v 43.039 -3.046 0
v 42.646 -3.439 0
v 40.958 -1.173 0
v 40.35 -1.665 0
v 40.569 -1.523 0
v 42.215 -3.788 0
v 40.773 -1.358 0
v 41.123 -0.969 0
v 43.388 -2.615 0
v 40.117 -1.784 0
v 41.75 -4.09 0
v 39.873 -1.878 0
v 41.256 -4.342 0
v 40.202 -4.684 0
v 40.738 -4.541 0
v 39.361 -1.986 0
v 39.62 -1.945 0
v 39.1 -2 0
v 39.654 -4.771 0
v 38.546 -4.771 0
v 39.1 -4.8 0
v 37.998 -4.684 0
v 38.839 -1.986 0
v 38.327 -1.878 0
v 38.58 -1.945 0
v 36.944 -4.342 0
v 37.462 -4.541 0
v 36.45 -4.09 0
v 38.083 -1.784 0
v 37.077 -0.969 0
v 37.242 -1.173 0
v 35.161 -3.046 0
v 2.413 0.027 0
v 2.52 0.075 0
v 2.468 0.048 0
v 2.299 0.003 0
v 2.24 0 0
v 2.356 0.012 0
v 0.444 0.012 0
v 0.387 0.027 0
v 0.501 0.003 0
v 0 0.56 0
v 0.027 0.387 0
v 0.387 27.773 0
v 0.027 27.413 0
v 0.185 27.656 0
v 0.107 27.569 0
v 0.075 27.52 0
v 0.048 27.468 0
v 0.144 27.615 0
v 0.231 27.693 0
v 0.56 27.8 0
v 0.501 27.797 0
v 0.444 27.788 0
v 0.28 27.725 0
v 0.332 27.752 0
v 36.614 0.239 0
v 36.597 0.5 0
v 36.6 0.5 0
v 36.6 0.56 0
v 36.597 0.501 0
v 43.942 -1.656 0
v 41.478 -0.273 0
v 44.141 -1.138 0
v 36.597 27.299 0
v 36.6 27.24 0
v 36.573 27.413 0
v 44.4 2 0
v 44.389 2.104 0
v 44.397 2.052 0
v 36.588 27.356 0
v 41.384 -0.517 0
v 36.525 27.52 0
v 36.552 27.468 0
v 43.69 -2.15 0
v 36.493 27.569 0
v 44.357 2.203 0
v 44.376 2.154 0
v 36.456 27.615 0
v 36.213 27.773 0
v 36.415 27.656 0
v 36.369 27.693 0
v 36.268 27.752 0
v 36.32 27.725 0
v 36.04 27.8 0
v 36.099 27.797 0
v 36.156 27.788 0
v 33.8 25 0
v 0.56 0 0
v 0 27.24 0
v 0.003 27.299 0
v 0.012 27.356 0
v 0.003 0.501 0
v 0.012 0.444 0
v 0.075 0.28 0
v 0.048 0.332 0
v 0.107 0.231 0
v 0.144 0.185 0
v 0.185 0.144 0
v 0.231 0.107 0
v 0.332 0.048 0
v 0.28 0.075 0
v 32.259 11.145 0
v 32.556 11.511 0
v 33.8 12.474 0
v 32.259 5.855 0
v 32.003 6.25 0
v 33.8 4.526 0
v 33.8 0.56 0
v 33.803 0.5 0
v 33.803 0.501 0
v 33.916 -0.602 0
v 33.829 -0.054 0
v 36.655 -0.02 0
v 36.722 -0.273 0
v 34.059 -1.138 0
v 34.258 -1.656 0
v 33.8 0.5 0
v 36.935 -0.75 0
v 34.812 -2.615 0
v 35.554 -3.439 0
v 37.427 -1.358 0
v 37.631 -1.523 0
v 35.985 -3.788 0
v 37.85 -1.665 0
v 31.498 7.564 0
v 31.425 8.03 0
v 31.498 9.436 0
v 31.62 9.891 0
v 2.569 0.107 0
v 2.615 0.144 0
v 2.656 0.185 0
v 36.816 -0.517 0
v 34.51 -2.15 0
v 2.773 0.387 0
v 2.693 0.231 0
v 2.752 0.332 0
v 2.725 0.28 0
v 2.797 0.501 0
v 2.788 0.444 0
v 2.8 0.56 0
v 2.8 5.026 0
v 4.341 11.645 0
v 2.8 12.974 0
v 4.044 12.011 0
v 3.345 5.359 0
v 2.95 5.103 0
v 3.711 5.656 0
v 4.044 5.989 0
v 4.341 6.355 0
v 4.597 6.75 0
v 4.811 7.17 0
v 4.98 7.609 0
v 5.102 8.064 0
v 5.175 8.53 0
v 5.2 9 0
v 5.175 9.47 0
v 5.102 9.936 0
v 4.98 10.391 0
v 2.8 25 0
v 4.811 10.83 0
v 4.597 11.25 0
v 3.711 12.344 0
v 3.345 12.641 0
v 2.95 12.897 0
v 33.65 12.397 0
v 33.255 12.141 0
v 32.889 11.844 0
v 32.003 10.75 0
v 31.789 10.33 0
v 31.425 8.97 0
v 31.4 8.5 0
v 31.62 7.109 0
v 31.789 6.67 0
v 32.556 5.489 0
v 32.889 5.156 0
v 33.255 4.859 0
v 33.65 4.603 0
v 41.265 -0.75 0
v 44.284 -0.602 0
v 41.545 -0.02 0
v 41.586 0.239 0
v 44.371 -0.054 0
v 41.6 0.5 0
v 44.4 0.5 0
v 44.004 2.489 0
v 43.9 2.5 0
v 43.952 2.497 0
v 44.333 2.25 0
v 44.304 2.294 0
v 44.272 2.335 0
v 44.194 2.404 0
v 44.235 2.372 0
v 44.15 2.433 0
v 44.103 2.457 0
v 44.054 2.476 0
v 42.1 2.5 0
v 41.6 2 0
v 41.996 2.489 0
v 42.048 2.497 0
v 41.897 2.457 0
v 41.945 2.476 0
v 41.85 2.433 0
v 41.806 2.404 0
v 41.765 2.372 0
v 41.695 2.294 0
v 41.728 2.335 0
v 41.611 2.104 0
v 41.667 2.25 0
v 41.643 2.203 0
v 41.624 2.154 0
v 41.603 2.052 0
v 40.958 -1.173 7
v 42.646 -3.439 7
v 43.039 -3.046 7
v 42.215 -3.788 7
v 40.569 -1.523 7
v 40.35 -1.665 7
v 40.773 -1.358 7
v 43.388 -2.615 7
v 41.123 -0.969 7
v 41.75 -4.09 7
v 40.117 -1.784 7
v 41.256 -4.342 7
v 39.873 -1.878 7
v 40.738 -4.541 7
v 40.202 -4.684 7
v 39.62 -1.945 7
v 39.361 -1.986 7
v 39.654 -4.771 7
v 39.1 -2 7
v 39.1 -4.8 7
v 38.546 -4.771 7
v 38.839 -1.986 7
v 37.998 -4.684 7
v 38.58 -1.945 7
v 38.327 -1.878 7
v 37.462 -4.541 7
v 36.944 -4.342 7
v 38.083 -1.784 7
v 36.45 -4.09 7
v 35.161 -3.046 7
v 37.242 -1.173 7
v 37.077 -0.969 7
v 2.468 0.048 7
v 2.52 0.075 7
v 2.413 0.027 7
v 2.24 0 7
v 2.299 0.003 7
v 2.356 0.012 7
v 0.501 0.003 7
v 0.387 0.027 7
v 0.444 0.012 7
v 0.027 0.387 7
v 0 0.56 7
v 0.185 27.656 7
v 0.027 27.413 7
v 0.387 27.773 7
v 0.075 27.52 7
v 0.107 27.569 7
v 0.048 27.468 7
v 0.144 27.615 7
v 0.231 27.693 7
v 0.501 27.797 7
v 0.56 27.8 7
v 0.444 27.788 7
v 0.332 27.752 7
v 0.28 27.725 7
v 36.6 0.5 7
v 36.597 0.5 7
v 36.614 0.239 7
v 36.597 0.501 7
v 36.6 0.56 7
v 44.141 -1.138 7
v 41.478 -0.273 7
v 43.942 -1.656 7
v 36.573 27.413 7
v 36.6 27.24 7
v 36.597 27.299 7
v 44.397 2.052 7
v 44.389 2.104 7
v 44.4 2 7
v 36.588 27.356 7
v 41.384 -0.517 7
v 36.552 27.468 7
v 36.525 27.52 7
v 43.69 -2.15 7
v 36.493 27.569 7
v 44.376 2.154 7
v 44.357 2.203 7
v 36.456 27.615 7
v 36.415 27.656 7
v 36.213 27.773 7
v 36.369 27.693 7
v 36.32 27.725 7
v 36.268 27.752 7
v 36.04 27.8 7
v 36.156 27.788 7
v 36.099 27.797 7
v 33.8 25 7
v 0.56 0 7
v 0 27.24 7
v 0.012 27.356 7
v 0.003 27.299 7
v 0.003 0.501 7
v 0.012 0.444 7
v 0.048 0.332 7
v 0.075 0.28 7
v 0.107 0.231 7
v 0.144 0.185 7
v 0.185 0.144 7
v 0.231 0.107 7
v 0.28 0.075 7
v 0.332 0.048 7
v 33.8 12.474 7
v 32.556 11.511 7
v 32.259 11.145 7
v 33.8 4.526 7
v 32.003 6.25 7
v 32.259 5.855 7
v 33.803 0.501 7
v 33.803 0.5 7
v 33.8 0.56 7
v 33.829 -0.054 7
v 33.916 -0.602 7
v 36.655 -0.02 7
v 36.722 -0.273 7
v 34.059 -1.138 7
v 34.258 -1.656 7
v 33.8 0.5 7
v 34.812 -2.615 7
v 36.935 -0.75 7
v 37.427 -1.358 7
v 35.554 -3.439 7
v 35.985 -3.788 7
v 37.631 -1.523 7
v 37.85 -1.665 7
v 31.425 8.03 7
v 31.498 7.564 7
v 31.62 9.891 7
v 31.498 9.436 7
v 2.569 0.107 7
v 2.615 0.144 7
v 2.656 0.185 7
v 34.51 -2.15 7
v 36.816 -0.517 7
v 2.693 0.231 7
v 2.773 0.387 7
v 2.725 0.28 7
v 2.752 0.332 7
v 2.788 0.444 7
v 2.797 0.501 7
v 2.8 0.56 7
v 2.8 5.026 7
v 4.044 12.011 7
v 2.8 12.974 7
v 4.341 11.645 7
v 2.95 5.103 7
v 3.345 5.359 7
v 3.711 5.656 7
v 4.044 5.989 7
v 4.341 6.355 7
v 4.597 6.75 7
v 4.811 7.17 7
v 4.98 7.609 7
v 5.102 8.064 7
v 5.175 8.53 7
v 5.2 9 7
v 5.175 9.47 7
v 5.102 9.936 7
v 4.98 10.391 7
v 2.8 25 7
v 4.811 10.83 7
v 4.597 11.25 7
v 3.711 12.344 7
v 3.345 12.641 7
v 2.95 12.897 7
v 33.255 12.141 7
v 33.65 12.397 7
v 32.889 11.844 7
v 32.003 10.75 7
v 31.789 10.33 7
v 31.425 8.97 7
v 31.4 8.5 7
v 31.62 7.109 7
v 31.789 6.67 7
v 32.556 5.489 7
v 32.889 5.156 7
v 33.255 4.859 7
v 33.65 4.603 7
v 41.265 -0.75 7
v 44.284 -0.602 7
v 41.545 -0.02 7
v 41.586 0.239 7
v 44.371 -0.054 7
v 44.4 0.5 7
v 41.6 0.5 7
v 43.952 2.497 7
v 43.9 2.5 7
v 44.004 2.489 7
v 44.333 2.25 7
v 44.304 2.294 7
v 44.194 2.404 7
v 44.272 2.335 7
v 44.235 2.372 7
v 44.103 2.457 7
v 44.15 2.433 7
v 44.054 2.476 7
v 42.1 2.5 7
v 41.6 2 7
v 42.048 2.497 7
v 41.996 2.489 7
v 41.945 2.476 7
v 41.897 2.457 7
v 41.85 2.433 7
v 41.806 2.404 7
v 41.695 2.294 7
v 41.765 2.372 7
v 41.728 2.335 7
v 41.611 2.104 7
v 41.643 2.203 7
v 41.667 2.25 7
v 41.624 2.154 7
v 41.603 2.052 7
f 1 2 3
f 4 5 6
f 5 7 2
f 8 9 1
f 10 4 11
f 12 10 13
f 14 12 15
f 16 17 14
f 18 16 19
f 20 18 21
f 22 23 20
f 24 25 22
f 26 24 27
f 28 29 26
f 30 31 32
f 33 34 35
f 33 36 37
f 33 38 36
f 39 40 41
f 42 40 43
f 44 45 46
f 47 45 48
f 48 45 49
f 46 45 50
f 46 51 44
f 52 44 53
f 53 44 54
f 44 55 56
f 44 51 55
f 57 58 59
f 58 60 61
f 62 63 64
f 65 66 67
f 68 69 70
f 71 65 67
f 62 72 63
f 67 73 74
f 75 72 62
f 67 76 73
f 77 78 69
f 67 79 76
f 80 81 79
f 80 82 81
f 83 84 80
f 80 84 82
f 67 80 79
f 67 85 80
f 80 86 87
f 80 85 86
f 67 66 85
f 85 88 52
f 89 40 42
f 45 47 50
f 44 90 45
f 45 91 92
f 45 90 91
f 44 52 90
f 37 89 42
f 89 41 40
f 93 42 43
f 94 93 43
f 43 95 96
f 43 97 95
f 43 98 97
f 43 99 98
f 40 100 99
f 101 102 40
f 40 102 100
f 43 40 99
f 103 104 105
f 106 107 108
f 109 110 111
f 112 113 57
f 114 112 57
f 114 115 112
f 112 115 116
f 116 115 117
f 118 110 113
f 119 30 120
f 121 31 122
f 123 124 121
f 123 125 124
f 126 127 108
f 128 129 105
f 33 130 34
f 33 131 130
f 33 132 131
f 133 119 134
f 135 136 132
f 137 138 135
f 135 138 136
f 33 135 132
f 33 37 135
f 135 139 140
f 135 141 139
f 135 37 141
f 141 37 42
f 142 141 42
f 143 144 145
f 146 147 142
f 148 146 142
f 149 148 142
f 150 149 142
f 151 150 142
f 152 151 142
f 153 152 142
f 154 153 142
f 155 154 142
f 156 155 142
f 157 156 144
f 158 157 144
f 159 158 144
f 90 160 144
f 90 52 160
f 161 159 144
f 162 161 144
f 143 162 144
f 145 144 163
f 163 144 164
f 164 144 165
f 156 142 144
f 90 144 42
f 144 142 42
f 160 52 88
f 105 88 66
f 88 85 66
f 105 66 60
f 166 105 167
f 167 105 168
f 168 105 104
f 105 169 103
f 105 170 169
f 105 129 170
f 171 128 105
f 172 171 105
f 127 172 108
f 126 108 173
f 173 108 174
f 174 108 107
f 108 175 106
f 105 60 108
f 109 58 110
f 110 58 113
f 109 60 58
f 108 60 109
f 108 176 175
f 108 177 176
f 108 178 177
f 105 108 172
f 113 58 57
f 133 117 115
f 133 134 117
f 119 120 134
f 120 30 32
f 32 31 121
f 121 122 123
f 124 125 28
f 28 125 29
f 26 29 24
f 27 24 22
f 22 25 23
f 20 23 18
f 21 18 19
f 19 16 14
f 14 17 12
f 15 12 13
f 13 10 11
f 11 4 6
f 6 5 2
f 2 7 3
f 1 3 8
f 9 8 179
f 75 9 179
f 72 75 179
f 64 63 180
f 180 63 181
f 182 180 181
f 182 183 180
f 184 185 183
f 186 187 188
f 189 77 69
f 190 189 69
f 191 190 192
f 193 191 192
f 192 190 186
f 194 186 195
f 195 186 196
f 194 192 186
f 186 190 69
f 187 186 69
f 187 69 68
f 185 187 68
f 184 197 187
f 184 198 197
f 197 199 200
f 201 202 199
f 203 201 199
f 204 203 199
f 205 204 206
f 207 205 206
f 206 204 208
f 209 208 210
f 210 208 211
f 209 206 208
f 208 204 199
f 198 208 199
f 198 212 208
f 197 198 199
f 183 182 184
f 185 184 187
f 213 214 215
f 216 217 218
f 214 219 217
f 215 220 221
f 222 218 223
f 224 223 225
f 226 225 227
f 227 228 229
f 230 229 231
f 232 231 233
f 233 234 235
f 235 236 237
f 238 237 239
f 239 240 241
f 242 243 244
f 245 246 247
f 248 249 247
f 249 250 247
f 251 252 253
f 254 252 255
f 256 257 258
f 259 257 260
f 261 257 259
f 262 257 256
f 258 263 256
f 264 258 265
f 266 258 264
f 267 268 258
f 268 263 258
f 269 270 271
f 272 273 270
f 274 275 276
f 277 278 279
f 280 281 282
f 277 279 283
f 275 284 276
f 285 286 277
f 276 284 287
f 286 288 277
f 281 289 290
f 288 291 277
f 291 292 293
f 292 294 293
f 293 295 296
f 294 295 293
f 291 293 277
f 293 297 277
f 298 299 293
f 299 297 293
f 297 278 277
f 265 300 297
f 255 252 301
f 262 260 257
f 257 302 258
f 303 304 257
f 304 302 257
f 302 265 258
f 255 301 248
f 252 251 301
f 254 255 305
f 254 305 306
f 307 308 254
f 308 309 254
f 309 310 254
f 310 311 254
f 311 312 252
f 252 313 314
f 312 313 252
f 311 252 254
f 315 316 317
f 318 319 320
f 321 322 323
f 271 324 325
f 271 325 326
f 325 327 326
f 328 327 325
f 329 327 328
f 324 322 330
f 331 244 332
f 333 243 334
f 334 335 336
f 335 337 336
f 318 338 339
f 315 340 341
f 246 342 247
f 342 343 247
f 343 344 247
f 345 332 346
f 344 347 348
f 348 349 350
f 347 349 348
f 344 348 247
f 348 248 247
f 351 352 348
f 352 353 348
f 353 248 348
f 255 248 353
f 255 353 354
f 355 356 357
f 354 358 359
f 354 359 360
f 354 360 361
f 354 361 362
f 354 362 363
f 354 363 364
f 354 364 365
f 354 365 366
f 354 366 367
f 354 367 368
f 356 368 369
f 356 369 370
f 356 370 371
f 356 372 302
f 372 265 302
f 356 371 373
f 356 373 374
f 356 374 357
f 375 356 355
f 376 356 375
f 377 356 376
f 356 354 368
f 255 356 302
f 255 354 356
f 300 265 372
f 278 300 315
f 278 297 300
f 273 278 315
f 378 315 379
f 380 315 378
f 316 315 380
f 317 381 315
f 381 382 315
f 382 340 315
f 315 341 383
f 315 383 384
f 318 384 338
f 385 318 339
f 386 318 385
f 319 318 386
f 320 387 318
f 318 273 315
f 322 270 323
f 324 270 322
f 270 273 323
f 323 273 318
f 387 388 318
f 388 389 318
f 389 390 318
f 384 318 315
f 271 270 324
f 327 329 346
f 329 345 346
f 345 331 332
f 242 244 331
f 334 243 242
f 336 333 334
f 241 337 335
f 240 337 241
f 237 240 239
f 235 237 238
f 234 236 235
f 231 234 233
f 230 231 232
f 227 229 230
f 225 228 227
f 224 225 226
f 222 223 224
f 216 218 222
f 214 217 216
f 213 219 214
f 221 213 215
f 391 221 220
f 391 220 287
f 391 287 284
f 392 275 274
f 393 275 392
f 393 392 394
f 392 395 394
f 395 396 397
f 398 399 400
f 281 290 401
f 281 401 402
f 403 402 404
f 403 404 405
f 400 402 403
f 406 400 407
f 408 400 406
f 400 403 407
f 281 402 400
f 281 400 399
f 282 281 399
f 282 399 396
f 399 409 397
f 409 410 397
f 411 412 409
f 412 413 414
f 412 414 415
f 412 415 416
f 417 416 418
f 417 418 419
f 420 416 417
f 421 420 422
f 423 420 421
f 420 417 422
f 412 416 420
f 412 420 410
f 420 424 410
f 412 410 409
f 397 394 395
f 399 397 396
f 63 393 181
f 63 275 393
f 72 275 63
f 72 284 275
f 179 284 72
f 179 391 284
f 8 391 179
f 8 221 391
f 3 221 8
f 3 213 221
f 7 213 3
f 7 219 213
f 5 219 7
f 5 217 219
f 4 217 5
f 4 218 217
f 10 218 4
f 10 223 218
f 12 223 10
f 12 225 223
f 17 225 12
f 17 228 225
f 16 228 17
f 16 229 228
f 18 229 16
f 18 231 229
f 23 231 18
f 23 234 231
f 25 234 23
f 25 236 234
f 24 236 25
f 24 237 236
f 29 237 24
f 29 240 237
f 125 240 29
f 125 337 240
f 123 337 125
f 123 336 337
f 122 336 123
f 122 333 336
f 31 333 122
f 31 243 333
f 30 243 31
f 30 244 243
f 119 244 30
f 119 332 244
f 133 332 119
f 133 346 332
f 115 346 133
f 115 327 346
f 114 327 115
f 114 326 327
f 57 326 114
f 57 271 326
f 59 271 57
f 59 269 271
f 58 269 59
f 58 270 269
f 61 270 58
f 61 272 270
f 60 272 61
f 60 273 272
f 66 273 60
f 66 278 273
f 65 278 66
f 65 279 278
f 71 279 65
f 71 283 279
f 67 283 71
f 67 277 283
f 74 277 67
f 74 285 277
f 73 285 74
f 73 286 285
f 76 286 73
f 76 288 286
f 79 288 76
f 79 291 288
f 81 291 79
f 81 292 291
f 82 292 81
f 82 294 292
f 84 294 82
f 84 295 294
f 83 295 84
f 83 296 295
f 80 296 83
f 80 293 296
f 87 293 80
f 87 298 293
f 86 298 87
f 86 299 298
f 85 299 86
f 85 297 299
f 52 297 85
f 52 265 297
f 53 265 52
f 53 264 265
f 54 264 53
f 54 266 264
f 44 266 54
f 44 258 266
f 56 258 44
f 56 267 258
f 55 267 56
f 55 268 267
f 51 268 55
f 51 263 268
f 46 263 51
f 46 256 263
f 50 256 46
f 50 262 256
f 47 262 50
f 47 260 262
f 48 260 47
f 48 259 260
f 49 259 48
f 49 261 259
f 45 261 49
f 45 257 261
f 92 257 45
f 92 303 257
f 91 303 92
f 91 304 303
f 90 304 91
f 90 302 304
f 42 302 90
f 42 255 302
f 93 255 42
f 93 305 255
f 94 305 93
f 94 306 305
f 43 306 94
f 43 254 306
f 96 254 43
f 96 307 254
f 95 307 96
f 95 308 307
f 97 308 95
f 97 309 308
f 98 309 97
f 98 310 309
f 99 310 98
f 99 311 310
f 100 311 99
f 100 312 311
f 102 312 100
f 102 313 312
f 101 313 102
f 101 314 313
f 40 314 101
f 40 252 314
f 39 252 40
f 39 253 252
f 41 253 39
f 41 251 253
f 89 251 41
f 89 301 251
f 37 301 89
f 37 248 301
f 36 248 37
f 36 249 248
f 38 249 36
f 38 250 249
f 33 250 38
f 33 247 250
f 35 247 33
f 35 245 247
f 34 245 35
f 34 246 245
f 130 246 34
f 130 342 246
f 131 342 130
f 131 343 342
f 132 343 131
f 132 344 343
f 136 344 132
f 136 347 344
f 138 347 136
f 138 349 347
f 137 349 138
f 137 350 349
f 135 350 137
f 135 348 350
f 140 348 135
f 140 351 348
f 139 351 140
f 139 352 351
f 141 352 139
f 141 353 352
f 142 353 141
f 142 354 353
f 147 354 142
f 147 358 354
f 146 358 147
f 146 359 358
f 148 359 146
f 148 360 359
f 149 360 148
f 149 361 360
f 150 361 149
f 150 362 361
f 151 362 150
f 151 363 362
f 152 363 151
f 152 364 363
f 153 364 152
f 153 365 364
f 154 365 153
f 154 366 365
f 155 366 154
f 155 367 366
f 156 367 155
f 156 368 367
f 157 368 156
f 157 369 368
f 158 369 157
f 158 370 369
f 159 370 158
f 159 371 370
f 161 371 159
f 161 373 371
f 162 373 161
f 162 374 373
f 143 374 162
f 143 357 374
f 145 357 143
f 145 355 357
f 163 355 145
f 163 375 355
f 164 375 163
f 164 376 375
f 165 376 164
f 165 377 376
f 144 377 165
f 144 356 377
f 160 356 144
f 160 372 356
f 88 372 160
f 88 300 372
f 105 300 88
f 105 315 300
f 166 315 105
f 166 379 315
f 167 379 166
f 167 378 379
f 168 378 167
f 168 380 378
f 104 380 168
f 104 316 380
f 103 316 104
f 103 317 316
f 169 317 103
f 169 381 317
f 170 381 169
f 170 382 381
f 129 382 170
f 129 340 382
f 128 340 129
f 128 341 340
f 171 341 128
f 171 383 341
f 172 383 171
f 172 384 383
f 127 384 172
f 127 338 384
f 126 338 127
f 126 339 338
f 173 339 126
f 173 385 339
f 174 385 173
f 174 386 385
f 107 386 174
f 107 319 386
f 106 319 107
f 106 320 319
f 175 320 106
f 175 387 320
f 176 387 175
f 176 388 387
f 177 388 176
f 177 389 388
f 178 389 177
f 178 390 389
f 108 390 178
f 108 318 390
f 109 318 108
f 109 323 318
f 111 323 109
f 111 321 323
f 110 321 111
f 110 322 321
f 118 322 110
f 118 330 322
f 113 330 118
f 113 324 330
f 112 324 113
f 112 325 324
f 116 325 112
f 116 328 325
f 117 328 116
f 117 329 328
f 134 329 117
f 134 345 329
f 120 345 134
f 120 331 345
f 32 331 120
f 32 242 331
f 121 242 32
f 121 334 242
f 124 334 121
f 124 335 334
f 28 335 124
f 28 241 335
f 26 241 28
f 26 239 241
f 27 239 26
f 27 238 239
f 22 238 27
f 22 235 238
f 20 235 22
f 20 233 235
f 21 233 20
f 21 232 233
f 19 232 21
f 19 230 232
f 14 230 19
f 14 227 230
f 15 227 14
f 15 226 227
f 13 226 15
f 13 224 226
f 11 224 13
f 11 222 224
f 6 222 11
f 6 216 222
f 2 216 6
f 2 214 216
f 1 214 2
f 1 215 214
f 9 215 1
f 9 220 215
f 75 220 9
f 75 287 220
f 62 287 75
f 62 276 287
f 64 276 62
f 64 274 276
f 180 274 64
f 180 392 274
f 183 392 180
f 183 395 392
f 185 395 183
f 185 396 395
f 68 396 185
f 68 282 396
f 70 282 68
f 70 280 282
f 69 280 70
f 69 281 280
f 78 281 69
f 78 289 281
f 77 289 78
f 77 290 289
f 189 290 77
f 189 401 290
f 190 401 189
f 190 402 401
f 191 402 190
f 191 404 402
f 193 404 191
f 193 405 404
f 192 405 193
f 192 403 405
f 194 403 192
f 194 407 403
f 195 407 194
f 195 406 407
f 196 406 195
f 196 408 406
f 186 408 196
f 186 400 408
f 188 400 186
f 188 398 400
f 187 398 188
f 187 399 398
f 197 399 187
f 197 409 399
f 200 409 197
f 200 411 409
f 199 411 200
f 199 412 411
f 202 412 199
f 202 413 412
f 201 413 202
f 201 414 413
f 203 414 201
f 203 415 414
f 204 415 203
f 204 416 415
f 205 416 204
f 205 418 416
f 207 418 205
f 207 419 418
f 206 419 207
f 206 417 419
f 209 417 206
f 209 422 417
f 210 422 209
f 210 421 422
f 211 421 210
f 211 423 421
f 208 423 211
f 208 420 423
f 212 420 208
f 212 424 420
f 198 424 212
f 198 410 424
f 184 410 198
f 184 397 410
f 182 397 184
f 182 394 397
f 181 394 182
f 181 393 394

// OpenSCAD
$fn=60;
// Measurements assumed as mm

// Internal measurement: bottom of 'leg' to top of arch
loop_height=25;
// Internal measurement: distance between legs desk is 31
loop_width=31; 

////
//Customisable options:
////
// Rounded or square profiled hook
hook_type="rounded";//[rounded,square]

// Internal measurement: gap between arch and hook lip. 5 for small hook, 21 for headset
hook_depth=5;//[1:40]

// Internal measurement: height of hook lip above semi circle. 2.5 recommended
hook_height=2.5;//[0:25]

// Print height from bed
print_height=7;//[1:15]

// Horizontal thickness of 2d shape
pla_width=2.8;//[2:5]



if(hook_type == "rounded"){
linear_extrude(height=print_height){
    roundedhook(loop_height, loop_width, pla_width, hook_depth, hook_height);
}};

if(hook_type == "square"){
linear_extrude(height=print_height){
    hook(loop_height, loop_width, pla_width, hook_depth, hook_height);
}};


// Hook with a semi-circular profile. Smoother for hanging things off
module roundedhook(loop_height, loop_width, pla_width, hook_depth, hook_height){
    union(){
        loop(loop_height, loop_width, pla_width);
        translate([loop_width + 2*pla_width + hook_depth/2, 0.5])semi_arc(hook_depth/2, pla_width);
        translate([loop_width + 2*pla_width + hook_depth, 0])rounded_square(pla_width, hook_height);
    }
}

// A hook with a square profile. Not great for hanging things on really
module hook(loop_height, loop_width, pla_width, hook_depth, hook_height){
    union(){
        loop(loop_height, loop_width, pla_width);
        translate([loop_width + pla_width, 0])rounded_square((2*pla_width + hook_depth), pla_width);
        translate([loop_width + 2*pla_width + hook_depth, 0])rounded_square(pla_width, hook_height);
    }
}

// The "U" shaped pard of the hook, that slots over the divider, with tabs to hold it in place
module loop(height, width, depth){
    union(){
      // Main U shape
        rounded_square(depth, height+depth);
        translate([0,height])rounded_square((2*depth + width), depth);
        translate([width+depth,0])rounded_square(depth, height+depth);

      // Tabs to hold in place
        translate([pla_width/4,height-16])rotate([0,0,90])semicircle(4.5); // magic number 16 is: 12mm top to gap, + circle rad - tiny bit to get it closer fitting.... Magic
        translate([width+depth+(3/4*pla_width),height-16.5])rotate([0,0,270])semicircle(4.5);
    }
}
    

// Produces a rectangle with rounded corners, starting at [0,0]
// Rounding has to be based on the smaller dimension, so we don't draw a square with negative sides
module rounded_square(width, length){
    rounding= width>length ? length*0.2 : width*0.2;
    translate([rounding, rounding])
    minkowski(){
        square([width-(2*rounding), length-(2*rounding)]);
        circle(rounding);
    }
}

// Semicircle. Go figure
module semicircle(radius){
difference(){
    circle(r=radius);
    translate([-radius,0])square(2*radius);
    }
}

// Cuts one semi-circle with another, to produce an arc
module semi_arc(radius, width){
    difference(){
    semicircle(radius+width);
    circle(r=radius);
    }
}
